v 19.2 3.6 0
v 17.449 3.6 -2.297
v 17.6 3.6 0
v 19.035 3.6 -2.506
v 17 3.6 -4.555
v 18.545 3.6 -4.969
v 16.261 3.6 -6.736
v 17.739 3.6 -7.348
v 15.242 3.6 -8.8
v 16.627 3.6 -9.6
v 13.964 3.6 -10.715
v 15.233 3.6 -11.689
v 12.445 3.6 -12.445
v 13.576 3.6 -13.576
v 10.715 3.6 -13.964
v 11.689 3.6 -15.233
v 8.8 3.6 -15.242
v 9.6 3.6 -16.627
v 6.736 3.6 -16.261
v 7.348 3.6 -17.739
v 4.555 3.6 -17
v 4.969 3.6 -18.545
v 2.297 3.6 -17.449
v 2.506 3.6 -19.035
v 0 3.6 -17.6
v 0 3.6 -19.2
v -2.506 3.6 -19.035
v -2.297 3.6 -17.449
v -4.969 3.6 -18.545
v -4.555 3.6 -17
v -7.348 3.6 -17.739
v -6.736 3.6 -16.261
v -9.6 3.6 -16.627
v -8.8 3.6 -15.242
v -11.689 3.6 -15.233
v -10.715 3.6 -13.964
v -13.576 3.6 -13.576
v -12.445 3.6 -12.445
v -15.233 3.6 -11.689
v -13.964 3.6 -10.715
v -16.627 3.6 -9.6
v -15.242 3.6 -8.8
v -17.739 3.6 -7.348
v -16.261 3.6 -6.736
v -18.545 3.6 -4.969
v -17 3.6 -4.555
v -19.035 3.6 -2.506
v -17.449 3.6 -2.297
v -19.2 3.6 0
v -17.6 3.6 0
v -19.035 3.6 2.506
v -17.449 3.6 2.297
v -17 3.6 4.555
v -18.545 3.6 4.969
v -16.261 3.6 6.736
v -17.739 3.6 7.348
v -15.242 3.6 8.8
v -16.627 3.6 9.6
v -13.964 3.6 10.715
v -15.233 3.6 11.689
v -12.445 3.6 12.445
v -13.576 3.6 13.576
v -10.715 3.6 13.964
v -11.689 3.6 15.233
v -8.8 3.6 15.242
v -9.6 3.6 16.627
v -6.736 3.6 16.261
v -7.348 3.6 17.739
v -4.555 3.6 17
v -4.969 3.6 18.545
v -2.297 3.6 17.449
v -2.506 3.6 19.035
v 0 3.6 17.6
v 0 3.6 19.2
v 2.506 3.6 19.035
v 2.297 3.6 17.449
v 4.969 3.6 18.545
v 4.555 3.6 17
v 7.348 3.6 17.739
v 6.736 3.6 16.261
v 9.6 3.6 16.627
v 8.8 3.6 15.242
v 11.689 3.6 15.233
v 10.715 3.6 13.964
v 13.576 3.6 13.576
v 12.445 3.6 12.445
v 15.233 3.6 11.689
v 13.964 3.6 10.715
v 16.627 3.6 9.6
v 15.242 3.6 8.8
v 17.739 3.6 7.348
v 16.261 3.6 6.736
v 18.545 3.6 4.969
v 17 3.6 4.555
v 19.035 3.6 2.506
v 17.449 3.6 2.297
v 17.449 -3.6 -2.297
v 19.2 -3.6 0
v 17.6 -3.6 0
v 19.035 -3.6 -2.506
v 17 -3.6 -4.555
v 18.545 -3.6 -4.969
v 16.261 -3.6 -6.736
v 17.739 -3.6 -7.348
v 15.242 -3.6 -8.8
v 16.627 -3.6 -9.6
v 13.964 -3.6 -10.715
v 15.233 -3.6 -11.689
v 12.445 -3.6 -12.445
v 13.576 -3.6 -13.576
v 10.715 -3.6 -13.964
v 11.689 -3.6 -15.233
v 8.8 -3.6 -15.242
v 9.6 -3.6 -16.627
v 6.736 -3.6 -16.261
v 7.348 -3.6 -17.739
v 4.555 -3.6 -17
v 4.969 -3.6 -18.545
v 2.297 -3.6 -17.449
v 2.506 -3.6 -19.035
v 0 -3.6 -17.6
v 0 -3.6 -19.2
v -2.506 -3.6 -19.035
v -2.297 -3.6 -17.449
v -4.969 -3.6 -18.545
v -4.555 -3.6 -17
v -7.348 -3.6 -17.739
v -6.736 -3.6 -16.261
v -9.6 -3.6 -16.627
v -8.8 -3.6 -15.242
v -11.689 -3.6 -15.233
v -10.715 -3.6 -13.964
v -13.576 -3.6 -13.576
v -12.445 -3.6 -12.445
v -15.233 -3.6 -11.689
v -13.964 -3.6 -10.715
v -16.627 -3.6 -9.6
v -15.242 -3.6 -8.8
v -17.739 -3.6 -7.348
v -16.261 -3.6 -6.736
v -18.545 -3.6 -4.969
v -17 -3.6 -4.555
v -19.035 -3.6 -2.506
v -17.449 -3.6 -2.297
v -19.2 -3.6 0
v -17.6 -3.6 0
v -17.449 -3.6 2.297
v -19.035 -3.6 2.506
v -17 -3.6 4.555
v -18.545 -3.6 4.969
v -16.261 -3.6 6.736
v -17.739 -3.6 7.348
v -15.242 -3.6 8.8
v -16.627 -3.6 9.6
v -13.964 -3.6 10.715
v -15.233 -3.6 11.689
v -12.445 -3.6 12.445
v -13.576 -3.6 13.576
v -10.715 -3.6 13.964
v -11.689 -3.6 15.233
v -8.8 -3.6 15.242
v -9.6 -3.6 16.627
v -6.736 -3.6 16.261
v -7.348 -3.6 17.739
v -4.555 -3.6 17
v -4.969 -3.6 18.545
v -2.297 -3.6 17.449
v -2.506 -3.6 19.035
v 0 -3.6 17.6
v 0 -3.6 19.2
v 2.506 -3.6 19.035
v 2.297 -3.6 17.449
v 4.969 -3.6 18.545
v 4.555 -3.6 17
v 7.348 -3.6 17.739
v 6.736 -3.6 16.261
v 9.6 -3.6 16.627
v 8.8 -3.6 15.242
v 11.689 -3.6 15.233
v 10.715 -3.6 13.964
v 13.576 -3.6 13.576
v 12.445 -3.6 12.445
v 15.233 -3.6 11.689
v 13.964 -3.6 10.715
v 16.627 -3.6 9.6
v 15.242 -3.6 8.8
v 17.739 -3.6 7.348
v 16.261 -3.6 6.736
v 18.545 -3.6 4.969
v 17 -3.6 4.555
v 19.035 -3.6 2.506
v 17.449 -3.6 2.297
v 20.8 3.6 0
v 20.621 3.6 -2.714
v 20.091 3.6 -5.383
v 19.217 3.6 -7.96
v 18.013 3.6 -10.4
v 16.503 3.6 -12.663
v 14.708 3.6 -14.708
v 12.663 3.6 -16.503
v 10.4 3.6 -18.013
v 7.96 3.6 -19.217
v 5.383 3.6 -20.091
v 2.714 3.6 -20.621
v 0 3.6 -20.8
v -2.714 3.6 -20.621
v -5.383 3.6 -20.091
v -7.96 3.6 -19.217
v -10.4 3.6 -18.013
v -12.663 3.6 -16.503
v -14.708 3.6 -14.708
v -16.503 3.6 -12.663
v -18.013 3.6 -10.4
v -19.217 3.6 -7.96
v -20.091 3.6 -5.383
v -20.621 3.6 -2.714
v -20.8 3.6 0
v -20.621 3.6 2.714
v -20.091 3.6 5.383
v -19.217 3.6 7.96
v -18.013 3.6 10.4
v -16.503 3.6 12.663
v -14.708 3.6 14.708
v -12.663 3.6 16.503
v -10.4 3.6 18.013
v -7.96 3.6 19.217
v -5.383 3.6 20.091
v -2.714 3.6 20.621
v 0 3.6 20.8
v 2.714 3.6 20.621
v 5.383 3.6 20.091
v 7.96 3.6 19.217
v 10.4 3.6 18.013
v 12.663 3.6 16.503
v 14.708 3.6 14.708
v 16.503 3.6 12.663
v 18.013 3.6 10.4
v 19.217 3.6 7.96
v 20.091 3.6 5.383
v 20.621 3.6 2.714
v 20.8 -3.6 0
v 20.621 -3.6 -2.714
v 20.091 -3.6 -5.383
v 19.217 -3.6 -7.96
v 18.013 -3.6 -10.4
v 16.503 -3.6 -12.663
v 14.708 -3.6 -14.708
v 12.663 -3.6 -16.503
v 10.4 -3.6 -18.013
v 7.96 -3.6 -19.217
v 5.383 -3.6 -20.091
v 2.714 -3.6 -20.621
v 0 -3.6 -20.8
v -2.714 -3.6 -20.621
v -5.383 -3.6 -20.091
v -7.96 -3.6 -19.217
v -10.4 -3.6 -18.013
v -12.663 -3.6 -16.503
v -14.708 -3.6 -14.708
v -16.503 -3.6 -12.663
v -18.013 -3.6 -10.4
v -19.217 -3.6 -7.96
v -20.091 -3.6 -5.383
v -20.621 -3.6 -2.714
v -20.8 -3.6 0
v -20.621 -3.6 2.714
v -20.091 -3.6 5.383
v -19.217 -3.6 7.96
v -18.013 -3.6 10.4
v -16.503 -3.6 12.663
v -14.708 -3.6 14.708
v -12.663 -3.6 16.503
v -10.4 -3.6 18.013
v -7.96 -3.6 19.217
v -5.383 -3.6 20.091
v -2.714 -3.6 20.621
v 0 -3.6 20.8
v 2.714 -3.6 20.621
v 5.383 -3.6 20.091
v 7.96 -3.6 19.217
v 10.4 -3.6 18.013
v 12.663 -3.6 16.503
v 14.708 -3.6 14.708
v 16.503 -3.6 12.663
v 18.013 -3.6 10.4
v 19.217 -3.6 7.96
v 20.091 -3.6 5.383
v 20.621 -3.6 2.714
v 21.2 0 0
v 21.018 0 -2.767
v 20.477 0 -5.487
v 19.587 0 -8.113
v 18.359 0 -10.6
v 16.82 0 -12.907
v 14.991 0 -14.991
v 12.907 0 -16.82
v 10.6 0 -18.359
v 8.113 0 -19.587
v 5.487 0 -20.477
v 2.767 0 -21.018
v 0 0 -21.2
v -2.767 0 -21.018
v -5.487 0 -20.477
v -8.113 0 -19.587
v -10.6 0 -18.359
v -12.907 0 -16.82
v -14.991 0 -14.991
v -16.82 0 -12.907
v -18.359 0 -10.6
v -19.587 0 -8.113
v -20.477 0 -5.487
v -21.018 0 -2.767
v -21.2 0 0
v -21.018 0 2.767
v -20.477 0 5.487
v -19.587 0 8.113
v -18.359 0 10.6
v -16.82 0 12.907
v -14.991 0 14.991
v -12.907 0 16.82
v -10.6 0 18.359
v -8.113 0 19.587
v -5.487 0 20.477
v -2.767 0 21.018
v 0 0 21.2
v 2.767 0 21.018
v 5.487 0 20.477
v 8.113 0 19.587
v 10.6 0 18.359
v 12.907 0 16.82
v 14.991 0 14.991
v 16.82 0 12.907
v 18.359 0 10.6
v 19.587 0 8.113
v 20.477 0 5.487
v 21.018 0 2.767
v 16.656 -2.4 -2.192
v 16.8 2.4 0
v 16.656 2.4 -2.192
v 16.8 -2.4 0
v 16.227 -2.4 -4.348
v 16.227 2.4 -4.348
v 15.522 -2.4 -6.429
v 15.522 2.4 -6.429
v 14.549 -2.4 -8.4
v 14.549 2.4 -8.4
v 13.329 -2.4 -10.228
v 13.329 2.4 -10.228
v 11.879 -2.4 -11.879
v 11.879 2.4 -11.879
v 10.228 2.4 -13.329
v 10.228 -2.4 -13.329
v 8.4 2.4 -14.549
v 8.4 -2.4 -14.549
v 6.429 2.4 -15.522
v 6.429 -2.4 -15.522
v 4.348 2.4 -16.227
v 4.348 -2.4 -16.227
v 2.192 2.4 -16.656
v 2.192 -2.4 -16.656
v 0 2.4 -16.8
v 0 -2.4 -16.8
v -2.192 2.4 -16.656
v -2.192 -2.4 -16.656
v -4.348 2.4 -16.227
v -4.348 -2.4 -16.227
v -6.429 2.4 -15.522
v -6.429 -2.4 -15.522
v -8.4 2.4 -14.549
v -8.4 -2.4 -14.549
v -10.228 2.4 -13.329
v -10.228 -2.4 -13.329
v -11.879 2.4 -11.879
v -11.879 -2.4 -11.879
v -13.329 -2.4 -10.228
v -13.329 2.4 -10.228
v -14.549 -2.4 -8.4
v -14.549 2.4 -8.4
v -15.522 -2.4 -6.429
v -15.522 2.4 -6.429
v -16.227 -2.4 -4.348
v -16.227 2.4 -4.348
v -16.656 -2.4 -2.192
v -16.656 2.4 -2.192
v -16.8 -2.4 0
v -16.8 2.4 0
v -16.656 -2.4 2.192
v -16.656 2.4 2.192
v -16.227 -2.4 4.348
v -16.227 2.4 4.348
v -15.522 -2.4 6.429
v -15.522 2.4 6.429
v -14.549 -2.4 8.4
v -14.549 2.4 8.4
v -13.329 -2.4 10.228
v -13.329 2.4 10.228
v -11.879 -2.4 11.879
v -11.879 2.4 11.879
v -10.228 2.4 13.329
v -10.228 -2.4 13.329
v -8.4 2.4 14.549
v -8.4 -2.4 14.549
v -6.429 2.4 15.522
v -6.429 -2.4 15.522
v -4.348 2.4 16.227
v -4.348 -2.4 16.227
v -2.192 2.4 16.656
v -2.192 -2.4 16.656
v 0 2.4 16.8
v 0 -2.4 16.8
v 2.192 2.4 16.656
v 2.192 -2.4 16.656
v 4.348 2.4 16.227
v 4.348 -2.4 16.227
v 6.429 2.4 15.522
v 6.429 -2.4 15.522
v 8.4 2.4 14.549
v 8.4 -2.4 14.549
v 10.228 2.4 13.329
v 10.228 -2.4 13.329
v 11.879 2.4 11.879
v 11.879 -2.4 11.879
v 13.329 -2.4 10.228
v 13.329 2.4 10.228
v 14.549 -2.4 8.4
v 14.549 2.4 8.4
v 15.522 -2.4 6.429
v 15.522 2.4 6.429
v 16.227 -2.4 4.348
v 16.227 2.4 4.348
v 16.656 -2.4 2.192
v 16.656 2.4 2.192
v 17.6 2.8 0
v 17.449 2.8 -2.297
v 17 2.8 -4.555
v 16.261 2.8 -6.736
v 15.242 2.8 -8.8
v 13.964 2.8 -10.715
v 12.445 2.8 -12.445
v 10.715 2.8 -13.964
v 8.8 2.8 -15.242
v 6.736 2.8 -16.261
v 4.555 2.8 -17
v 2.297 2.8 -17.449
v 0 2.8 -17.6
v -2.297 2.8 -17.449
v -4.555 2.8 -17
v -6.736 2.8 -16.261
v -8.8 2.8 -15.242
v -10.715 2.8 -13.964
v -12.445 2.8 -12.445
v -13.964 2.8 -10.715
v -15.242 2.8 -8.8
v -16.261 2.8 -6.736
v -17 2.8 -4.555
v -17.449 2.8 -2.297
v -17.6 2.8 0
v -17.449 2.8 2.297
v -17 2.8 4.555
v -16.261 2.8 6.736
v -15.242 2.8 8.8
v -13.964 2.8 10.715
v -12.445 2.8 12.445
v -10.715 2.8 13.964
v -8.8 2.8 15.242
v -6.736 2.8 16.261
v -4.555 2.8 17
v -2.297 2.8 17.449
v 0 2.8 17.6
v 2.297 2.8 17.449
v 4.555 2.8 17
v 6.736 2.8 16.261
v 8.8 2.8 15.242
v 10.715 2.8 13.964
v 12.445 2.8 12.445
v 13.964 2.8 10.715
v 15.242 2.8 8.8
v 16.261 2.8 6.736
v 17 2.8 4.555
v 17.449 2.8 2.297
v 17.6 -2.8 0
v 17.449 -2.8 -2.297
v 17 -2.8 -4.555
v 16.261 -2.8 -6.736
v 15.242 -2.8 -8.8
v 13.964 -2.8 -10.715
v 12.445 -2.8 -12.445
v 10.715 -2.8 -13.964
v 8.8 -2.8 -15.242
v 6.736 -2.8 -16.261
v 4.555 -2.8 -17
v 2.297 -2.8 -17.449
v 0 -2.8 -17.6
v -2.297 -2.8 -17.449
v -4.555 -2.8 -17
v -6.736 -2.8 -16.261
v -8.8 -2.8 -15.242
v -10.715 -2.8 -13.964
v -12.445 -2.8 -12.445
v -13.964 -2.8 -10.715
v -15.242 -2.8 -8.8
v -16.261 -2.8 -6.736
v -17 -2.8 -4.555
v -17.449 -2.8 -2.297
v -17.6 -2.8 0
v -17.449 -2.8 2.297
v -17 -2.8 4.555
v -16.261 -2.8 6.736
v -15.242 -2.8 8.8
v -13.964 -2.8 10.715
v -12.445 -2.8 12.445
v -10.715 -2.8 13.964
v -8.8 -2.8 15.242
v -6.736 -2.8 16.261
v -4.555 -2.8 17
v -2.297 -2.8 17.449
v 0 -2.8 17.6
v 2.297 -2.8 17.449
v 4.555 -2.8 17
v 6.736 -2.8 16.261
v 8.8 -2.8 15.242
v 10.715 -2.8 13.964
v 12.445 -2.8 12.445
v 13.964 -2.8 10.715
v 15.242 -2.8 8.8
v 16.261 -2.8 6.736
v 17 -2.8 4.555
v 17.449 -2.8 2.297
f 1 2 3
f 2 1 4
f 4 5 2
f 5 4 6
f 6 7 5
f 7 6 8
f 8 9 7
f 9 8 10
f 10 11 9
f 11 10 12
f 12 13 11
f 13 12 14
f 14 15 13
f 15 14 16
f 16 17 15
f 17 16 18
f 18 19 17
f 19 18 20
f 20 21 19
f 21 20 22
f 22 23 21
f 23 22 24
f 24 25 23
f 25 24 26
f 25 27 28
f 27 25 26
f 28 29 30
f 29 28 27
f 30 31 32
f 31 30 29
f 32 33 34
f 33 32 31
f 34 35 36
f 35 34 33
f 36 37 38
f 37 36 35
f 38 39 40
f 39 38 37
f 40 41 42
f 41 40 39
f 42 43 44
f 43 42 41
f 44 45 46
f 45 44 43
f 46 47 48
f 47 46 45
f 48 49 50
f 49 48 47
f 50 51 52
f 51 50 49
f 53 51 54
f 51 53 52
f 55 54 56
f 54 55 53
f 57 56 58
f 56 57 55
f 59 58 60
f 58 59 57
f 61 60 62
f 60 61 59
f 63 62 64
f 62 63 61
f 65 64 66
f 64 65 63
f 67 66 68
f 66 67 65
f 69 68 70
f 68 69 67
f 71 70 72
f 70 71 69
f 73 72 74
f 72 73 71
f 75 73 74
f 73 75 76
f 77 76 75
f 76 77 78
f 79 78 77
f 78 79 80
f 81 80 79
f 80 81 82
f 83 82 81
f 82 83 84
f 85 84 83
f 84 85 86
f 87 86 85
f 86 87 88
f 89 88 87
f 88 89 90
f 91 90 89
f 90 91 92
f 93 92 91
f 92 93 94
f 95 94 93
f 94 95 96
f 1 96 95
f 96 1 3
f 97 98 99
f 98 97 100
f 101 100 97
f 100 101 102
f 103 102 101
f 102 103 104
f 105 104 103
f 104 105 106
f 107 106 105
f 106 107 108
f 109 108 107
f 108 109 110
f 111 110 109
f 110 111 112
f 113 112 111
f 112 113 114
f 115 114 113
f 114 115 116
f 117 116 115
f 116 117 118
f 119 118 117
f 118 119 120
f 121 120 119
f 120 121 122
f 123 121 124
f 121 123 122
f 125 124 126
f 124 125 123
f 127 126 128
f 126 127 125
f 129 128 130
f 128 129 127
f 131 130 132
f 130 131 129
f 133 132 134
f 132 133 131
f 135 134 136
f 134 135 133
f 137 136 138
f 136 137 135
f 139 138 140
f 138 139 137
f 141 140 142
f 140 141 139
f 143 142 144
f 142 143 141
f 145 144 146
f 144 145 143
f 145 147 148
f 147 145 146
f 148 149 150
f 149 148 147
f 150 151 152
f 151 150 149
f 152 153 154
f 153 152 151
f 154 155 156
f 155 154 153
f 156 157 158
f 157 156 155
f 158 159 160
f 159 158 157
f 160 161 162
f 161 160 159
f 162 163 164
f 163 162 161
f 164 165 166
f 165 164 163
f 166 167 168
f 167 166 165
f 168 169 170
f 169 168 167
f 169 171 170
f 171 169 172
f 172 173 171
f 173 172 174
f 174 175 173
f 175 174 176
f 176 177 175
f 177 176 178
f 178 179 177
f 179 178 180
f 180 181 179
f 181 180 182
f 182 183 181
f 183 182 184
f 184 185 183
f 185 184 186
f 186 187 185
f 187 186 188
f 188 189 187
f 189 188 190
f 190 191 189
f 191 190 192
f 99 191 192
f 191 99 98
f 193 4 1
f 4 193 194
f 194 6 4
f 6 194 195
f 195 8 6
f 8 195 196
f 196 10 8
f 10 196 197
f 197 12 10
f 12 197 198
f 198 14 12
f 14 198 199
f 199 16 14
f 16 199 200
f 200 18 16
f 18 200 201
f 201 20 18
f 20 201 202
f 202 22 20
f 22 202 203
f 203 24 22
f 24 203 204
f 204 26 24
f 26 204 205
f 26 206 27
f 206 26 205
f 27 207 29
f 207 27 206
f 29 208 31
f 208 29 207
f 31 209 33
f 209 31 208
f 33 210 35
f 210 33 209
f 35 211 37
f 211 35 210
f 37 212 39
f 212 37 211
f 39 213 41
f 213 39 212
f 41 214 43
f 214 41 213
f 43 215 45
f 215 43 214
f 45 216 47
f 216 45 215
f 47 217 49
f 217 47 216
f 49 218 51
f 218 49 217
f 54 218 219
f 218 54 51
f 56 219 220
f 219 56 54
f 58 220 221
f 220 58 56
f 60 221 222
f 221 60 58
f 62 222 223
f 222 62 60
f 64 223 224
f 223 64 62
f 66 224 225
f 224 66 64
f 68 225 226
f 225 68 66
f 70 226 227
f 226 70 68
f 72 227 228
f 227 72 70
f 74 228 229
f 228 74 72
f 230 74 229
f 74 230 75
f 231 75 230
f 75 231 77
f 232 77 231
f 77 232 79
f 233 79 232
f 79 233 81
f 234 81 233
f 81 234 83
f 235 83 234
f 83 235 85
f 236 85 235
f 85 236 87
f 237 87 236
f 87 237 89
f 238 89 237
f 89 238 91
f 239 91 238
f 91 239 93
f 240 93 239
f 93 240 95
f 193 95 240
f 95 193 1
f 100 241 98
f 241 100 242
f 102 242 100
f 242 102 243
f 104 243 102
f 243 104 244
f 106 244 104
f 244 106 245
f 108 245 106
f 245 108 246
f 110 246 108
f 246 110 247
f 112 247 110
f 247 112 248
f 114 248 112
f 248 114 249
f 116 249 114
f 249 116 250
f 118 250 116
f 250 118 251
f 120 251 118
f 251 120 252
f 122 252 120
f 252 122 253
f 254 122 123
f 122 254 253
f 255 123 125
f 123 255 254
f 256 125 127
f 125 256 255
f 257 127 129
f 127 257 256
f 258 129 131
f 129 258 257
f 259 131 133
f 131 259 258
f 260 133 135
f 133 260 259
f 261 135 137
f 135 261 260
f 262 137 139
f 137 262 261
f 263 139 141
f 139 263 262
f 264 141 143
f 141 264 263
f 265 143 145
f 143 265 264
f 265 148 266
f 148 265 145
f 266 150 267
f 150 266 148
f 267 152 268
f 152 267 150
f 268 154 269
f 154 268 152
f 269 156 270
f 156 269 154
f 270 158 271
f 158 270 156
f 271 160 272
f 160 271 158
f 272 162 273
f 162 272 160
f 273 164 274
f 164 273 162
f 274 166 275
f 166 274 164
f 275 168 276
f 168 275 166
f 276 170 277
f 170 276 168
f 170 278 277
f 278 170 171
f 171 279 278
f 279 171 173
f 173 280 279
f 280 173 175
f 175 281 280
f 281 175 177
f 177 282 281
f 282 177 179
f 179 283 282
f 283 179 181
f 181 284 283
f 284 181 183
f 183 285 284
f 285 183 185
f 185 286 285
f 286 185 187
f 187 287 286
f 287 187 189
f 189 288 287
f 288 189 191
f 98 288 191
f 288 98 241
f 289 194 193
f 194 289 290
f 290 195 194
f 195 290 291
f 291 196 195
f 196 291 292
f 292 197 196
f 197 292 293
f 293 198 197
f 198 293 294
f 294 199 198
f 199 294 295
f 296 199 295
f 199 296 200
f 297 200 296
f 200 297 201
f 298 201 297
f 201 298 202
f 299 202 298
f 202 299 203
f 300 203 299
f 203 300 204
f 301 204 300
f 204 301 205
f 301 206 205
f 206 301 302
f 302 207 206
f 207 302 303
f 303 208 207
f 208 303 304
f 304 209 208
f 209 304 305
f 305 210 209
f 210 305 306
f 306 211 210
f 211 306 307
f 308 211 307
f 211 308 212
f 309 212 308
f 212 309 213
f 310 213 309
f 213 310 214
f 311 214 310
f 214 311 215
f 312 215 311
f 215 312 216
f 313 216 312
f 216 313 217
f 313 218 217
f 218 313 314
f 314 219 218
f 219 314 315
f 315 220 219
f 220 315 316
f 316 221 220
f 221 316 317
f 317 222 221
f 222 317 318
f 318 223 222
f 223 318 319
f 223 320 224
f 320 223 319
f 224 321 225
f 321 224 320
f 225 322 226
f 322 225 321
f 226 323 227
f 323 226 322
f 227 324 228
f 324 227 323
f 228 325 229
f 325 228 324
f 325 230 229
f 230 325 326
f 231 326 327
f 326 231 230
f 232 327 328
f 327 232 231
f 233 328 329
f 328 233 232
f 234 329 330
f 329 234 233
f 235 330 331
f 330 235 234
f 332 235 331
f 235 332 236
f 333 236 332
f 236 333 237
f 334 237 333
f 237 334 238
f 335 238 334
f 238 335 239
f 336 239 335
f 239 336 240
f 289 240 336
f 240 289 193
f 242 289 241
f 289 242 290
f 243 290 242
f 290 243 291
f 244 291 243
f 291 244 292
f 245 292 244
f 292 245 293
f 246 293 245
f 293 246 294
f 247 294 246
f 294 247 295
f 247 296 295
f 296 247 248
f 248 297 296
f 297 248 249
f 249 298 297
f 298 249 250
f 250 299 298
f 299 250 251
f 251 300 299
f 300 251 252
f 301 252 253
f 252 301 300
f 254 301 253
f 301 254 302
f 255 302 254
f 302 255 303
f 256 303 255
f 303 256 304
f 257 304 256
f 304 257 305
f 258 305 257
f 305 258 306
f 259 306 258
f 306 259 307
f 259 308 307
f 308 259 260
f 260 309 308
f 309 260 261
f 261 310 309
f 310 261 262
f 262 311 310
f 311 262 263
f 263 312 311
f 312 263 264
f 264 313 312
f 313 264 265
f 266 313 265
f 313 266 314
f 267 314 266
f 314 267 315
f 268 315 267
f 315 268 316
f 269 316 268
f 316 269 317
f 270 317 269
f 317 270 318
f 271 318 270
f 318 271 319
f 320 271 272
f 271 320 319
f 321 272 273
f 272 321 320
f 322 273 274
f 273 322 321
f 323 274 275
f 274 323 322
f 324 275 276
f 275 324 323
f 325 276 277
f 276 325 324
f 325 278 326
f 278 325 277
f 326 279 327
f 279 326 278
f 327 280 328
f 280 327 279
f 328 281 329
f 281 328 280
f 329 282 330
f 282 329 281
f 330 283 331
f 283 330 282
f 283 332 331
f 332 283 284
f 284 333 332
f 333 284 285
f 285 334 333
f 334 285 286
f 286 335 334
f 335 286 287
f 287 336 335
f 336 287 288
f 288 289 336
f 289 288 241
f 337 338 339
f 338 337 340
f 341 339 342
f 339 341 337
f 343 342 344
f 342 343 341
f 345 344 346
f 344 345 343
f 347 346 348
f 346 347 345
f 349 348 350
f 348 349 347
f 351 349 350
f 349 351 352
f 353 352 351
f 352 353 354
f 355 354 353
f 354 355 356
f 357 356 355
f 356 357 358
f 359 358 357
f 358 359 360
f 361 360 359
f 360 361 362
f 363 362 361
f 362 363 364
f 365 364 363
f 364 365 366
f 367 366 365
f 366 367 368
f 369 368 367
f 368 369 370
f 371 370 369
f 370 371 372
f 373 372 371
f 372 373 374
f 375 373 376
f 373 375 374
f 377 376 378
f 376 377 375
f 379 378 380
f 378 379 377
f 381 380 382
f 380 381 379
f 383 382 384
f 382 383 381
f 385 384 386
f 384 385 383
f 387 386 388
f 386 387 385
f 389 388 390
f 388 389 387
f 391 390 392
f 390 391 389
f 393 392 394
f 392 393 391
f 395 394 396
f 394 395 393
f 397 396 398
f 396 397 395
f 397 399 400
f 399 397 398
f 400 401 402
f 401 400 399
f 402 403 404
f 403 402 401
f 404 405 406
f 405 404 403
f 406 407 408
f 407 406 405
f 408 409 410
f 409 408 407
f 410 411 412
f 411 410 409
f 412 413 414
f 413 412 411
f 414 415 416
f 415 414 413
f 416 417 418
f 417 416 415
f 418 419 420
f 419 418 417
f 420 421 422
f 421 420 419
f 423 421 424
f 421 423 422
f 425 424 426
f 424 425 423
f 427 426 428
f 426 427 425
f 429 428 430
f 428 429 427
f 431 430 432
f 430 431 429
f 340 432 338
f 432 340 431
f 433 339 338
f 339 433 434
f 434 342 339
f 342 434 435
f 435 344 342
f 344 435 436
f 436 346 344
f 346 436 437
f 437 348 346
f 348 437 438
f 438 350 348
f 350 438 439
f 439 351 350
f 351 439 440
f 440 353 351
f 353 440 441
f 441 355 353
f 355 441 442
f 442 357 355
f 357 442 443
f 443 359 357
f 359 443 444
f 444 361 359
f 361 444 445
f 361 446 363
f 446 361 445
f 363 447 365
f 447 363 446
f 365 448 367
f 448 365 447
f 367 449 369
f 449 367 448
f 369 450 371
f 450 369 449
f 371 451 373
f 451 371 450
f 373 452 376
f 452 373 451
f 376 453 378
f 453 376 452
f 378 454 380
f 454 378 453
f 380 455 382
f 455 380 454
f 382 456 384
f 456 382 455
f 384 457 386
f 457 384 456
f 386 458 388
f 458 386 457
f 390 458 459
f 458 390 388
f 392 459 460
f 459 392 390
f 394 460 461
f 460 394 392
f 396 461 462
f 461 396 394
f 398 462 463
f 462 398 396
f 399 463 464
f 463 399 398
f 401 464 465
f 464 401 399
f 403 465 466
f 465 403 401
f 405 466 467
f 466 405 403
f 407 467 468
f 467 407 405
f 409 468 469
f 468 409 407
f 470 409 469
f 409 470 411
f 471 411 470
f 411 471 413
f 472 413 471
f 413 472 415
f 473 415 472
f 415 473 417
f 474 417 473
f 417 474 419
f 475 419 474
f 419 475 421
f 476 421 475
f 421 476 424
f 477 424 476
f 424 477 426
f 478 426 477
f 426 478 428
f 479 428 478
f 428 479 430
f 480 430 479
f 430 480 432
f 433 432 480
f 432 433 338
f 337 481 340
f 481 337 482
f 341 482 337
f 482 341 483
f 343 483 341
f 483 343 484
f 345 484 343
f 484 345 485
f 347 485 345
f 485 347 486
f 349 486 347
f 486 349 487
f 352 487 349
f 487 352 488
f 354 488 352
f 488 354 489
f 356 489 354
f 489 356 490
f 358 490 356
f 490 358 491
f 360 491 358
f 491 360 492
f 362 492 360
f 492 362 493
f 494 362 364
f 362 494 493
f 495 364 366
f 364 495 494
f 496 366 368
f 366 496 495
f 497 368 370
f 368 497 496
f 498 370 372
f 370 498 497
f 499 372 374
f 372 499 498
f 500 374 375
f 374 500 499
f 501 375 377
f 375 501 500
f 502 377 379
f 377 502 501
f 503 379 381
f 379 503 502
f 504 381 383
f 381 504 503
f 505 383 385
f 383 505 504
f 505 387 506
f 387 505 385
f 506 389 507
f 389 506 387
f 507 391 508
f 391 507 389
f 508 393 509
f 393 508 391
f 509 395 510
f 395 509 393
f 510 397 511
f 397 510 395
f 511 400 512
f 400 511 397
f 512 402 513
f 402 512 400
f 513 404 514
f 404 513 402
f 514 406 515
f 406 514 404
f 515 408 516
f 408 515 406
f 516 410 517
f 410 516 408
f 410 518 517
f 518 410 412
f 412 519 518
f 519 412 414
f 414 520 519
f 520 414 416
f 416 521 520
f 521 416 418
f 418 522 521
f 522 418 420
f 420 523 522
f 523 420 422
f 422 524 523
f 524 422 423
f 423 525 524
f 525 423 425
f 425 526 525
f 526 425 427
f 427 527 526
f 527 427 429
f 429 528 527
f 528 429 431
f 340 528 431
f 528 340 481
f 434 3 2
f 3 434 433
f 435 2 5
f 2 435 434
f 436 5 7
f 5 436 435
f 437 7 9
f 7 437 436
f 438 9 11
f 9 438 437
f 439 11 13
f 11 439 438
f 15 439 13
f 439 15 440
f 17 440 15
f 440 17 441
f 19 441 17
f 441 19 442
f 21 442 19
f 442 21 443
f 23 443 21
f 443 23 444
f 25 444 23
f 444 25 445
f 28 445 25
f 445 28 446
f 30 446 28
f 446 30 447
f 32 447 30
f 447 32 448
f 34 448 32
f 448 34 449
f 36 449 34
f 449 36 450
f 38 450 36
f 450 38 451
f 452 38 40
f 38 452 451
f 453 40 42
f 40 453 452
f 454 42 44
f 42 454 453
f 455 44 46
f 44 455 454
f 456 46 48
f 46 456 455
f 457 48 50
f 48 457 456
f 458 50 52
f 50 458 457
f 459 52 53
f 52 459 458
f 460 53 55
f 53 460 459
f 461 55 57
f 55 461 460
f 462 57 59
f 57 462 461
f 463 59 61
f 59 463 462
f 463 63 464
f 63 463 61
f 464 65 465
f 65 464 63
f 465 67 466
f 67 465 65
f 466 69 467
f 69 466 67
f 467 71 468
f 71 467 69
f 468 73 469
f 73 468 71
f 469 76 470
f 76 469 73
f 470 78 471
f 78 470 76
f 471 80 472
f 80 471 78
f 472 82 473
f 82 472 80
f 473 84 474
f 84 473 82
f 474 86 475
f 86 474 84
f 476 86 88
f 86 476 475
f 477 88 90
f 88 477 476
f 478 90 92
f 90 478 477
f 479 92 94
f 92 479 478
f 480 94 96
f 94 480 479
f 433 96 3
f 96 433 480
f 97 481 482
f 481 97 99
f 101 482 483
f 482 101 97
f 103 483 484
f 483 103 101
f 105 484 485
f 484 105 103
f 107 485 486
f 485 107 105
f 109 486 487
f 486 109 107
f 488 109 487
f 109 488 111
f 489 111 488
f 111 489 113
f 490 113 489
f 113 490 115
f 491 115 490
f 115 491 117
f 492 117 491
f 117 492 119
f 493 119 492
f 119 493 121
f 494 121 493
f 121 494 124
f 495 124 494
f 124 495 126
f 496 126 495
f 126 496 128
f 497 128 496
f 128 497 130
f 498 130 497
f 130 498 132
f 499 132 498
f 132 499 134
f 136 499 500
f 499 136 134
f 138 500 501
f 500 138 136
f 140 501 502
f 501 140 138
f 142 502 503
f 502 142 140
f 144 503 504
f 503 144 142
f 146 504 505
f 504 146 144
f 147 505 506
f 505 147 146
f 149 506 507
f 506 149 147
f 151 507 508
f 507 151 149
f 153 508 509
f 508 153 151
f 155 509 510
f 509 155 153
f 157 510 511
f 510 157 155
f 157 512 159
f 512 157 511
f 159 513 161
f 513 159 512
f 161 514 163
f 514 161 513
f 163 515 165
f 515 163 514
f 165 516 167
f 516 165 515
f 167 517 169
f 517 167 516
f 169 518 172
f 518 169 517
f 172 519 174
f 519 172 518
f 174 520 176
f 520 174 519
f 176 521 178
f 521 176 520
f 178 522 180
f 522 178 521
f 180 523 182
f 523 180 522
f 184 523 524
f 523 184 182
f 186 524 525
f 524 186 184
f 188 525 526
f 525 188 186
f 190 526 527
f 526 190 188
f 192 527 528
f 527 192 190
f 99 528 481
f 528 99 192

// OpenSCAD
use <../lib.scad>
use <../p/48/4-4con21.scad>
use <../p/48/4-4con52.scad>
use <../p/48/4-4cylo.scad>
use <../p/48/4-4edge.scad>
use <../p/48/4-4ring11.scad>
use <../p/48/4-4ring12.scad>
function ldraw_lib__36() = [
// 0 Tyre  7/ 50 x 36
// 0 Name: 36.dat
// 0 Author: James Jessiman
// 0 !LDRAW_ORG Part UPDATE 2026-06
// 0 !LICENSE Licensed under CC BY 4.0 : see CAreadme.txt
// 
// 0 BFC CERTIFY CCW
  [0,"BFC","CERTIFY"],
  [0,"BFC","CCW"],
// 
// 0 !KEYWORDS Brickowl 725543
// 
// 0 !HISTORY 2003-06-08 [jriley] BFC compliant using circular primitives
// 0 !HISTORY 2004-04-22 [PTadmin] Official Update 2004-02
// 0 !HISTORY 2007-06-25 [PTadmin] Header formatted for Contributor Agreement
// 0 !HISTORY 2008-07-01 [PTadmin] Official Update 2008-01
// 0 !HISTORY 2024-03-23 [OrionP] Updated ring primitives
// 0 !HISTORY 2024-03-24 [OrionP] Official Update 2024-02
// 0 !HISTORY 2025-03-22 [Blechtaler] added BL number to differentiate
// 0 !HISTORY 2026-06-28 [OrionP] Official Update 2026-06
// 
// 1 16 0 0 9 46 0 0 0 0 46 0 1 0 48\4-4edge.dat
  [1,16,0,0,9,46,0,0,0,0,46,0,1,0, ldraw_lib__48__4_4edge()],
// 1 16 0 0 -9 46 0 0 0 0 46 0 1 0 48\4-4edge.dat
  [1,16,0,0,-9,46,0,0,0,0,46,0,1,0, ldraw_lib__48__4_4edge()],
// 1 16 0 0 9 48 0 0 0 0 48 0 1 0 48\4-4edge.dat
  [1,16,0,0,9,48,0,0,0,0,48,0,1,0, ldraw_lib__48__4_4edge()],
// 1 16 0 0 -9 48 0 0 0 0 48 0 1 0 48\4-4edge.dat
  [1,16,0,0,-9,48,0,0,0,0,48,0,1,0, ldraw_lib__48__4_4edge()],
// 1 16 0 0 9 50 0 0 0 0 50 0 1 0 48\4-4edge.dat
  [1,16,0,0,9,50,0,0,0,0,50,0,1,0, ldraw_lib__48__4_4edge()],
// 1 16 0 0 -9 50 0 0 0 0 50 0 1 0 48\4-4edge.dat
  [1,16,0,0,-9,50,0,0,0,0,50,0,1,0, ldraw_lib__48__4_4edge()],
// 1 16 0 0 9 52 0 0 0 0 52 0 1 0 48\4-4edge.dat
  [1,16,0,0,9,52,0,0,0,0,52,0,1,0, ldraw_lib__48__4_4edge()],
// 1 16 0 0 -9 52 0 0 0 0 52 0 1 0 48\4-4edge.dat
  [1,16,0,0,-9,52,0,0,0,0,52,0,1,0, ldraw_lib__48__4_4edge()],
// 1 16 0 0 0 53 0 0 0 0 53 0 1 0 48\4-4edge.dat
  [1,16,0,0,0,53,0,0,0,0,53,0,1,0, ldraw_lib__48__4_4edge()],
// 1 16 0 0 9 4 0 0 0 0 4 0 -1 0 48\4-4ring11.dat
  [1,16,0,0,9,4,0,0,0,0,4,0,-1,0, ldraw_lib__48__4_4ring11()],
// 1 16 0 0 -9 4 0 0 0 0 4 0 1 0 48\4-4ring11.dat
  [1,16,0,0,-9,4,0,0,0,0,4,0,1,0, ldraw_lib__48__4_4ring11()],
// 1 16 0 0 9 4 0 0 0 0 4 0 -1 0 48\4-4ring12.dat
  [1,16,0,0,9,4,0,0,0,0,4,0,-1,0, ldraw_lib__48__4_4ring12()],
// 1 16 0 0 -9 4 0 0 0 0 4 0 1 0 48\4-4ring12.dat
  [1,16,0,0,-9,4,0,0,0,0,4,0,1,0, ldraw_lib__48__4_4ring12()],
// 1 16 0 0 0 1 0 0 0 0 1 0 9 0 48\4-4con52.dat
  [1,16,0,0,0,1,0,0,0,0,1,0,9,0, ldraw_lib__48__4_4con52()],
// 1 16 0 0 0 1 0 0 0 0 1 0 -9 0 48\4-4con52.dat
  [1,16,0,0,0,1,0,0,0,0,1,0,-9,0, ldraw_lib__48__4_4con52()],
// 0 BFC INVERTNEXT
  [0,"BFC","INVERTNEXT"],
// 1 16 0 0 -6 42 0 0 0 0 42 0 12 0 48\4-4cylo.dat
  [1,16,0,0,-6,42,0,0,0,0,42,0,12,0, ldraw_lib__48__4_4cylo()],
// 0 BFC INVERTNEXT
  [0,"BFC","INVERTNEXT"],
// 1 16 0 0 7 2 0 0 0 0 2 0 -1 0 48\4-4con21.dat
  [1,16,0,0,7,2,0,0,0,0,2,0,-1,0, ldraw_lib__48__4_4con21()],
// 0 BFC INVERTNEXT
  [0,"BFC","INVERTNEXT"],
// 1 16 0 0 -7 2 0 0 0 0 2 0 1 0 48\4-4con21.dat
  [1,16,0,0,-7,2,0,0,0,0,2,0,1,0, ldraw_lib__48__4_4con21()],
// 0 BFC INVERTNEXT
  [0,"BFC","INVERTNEXT"],
// 1 16 0 0 7 44 0 0 0 0 44 0 2 0 48\4-4cylo.dat
  [1,16,0,0,7,44,0,0,0,0,44,0,2,0, ldraw_lib__48__4_4cylo()],
// 0 BFC INVERTNEXT
  [0,"BFC","INVERTNEXT"],
// 1 16 0 0 -7 44 0 0 0 0 44 0 -2 0 48\4-4cylo.dat
  [1,16,0,0,-7,44,0,0,0,0,44,0,-2,0, ldraw_lib__48__4_4cylo()],
];
module ldraw_lib__36(step=0, col=false, unit=2/5, alt=false, line=0.2, solid=!$preview)
    makepoly(ldraw_lib__36(), step=step, col=col, unit=unit, alt=alt, line=line, solid=solid);
ldraw_lib__36(line=0.2);
